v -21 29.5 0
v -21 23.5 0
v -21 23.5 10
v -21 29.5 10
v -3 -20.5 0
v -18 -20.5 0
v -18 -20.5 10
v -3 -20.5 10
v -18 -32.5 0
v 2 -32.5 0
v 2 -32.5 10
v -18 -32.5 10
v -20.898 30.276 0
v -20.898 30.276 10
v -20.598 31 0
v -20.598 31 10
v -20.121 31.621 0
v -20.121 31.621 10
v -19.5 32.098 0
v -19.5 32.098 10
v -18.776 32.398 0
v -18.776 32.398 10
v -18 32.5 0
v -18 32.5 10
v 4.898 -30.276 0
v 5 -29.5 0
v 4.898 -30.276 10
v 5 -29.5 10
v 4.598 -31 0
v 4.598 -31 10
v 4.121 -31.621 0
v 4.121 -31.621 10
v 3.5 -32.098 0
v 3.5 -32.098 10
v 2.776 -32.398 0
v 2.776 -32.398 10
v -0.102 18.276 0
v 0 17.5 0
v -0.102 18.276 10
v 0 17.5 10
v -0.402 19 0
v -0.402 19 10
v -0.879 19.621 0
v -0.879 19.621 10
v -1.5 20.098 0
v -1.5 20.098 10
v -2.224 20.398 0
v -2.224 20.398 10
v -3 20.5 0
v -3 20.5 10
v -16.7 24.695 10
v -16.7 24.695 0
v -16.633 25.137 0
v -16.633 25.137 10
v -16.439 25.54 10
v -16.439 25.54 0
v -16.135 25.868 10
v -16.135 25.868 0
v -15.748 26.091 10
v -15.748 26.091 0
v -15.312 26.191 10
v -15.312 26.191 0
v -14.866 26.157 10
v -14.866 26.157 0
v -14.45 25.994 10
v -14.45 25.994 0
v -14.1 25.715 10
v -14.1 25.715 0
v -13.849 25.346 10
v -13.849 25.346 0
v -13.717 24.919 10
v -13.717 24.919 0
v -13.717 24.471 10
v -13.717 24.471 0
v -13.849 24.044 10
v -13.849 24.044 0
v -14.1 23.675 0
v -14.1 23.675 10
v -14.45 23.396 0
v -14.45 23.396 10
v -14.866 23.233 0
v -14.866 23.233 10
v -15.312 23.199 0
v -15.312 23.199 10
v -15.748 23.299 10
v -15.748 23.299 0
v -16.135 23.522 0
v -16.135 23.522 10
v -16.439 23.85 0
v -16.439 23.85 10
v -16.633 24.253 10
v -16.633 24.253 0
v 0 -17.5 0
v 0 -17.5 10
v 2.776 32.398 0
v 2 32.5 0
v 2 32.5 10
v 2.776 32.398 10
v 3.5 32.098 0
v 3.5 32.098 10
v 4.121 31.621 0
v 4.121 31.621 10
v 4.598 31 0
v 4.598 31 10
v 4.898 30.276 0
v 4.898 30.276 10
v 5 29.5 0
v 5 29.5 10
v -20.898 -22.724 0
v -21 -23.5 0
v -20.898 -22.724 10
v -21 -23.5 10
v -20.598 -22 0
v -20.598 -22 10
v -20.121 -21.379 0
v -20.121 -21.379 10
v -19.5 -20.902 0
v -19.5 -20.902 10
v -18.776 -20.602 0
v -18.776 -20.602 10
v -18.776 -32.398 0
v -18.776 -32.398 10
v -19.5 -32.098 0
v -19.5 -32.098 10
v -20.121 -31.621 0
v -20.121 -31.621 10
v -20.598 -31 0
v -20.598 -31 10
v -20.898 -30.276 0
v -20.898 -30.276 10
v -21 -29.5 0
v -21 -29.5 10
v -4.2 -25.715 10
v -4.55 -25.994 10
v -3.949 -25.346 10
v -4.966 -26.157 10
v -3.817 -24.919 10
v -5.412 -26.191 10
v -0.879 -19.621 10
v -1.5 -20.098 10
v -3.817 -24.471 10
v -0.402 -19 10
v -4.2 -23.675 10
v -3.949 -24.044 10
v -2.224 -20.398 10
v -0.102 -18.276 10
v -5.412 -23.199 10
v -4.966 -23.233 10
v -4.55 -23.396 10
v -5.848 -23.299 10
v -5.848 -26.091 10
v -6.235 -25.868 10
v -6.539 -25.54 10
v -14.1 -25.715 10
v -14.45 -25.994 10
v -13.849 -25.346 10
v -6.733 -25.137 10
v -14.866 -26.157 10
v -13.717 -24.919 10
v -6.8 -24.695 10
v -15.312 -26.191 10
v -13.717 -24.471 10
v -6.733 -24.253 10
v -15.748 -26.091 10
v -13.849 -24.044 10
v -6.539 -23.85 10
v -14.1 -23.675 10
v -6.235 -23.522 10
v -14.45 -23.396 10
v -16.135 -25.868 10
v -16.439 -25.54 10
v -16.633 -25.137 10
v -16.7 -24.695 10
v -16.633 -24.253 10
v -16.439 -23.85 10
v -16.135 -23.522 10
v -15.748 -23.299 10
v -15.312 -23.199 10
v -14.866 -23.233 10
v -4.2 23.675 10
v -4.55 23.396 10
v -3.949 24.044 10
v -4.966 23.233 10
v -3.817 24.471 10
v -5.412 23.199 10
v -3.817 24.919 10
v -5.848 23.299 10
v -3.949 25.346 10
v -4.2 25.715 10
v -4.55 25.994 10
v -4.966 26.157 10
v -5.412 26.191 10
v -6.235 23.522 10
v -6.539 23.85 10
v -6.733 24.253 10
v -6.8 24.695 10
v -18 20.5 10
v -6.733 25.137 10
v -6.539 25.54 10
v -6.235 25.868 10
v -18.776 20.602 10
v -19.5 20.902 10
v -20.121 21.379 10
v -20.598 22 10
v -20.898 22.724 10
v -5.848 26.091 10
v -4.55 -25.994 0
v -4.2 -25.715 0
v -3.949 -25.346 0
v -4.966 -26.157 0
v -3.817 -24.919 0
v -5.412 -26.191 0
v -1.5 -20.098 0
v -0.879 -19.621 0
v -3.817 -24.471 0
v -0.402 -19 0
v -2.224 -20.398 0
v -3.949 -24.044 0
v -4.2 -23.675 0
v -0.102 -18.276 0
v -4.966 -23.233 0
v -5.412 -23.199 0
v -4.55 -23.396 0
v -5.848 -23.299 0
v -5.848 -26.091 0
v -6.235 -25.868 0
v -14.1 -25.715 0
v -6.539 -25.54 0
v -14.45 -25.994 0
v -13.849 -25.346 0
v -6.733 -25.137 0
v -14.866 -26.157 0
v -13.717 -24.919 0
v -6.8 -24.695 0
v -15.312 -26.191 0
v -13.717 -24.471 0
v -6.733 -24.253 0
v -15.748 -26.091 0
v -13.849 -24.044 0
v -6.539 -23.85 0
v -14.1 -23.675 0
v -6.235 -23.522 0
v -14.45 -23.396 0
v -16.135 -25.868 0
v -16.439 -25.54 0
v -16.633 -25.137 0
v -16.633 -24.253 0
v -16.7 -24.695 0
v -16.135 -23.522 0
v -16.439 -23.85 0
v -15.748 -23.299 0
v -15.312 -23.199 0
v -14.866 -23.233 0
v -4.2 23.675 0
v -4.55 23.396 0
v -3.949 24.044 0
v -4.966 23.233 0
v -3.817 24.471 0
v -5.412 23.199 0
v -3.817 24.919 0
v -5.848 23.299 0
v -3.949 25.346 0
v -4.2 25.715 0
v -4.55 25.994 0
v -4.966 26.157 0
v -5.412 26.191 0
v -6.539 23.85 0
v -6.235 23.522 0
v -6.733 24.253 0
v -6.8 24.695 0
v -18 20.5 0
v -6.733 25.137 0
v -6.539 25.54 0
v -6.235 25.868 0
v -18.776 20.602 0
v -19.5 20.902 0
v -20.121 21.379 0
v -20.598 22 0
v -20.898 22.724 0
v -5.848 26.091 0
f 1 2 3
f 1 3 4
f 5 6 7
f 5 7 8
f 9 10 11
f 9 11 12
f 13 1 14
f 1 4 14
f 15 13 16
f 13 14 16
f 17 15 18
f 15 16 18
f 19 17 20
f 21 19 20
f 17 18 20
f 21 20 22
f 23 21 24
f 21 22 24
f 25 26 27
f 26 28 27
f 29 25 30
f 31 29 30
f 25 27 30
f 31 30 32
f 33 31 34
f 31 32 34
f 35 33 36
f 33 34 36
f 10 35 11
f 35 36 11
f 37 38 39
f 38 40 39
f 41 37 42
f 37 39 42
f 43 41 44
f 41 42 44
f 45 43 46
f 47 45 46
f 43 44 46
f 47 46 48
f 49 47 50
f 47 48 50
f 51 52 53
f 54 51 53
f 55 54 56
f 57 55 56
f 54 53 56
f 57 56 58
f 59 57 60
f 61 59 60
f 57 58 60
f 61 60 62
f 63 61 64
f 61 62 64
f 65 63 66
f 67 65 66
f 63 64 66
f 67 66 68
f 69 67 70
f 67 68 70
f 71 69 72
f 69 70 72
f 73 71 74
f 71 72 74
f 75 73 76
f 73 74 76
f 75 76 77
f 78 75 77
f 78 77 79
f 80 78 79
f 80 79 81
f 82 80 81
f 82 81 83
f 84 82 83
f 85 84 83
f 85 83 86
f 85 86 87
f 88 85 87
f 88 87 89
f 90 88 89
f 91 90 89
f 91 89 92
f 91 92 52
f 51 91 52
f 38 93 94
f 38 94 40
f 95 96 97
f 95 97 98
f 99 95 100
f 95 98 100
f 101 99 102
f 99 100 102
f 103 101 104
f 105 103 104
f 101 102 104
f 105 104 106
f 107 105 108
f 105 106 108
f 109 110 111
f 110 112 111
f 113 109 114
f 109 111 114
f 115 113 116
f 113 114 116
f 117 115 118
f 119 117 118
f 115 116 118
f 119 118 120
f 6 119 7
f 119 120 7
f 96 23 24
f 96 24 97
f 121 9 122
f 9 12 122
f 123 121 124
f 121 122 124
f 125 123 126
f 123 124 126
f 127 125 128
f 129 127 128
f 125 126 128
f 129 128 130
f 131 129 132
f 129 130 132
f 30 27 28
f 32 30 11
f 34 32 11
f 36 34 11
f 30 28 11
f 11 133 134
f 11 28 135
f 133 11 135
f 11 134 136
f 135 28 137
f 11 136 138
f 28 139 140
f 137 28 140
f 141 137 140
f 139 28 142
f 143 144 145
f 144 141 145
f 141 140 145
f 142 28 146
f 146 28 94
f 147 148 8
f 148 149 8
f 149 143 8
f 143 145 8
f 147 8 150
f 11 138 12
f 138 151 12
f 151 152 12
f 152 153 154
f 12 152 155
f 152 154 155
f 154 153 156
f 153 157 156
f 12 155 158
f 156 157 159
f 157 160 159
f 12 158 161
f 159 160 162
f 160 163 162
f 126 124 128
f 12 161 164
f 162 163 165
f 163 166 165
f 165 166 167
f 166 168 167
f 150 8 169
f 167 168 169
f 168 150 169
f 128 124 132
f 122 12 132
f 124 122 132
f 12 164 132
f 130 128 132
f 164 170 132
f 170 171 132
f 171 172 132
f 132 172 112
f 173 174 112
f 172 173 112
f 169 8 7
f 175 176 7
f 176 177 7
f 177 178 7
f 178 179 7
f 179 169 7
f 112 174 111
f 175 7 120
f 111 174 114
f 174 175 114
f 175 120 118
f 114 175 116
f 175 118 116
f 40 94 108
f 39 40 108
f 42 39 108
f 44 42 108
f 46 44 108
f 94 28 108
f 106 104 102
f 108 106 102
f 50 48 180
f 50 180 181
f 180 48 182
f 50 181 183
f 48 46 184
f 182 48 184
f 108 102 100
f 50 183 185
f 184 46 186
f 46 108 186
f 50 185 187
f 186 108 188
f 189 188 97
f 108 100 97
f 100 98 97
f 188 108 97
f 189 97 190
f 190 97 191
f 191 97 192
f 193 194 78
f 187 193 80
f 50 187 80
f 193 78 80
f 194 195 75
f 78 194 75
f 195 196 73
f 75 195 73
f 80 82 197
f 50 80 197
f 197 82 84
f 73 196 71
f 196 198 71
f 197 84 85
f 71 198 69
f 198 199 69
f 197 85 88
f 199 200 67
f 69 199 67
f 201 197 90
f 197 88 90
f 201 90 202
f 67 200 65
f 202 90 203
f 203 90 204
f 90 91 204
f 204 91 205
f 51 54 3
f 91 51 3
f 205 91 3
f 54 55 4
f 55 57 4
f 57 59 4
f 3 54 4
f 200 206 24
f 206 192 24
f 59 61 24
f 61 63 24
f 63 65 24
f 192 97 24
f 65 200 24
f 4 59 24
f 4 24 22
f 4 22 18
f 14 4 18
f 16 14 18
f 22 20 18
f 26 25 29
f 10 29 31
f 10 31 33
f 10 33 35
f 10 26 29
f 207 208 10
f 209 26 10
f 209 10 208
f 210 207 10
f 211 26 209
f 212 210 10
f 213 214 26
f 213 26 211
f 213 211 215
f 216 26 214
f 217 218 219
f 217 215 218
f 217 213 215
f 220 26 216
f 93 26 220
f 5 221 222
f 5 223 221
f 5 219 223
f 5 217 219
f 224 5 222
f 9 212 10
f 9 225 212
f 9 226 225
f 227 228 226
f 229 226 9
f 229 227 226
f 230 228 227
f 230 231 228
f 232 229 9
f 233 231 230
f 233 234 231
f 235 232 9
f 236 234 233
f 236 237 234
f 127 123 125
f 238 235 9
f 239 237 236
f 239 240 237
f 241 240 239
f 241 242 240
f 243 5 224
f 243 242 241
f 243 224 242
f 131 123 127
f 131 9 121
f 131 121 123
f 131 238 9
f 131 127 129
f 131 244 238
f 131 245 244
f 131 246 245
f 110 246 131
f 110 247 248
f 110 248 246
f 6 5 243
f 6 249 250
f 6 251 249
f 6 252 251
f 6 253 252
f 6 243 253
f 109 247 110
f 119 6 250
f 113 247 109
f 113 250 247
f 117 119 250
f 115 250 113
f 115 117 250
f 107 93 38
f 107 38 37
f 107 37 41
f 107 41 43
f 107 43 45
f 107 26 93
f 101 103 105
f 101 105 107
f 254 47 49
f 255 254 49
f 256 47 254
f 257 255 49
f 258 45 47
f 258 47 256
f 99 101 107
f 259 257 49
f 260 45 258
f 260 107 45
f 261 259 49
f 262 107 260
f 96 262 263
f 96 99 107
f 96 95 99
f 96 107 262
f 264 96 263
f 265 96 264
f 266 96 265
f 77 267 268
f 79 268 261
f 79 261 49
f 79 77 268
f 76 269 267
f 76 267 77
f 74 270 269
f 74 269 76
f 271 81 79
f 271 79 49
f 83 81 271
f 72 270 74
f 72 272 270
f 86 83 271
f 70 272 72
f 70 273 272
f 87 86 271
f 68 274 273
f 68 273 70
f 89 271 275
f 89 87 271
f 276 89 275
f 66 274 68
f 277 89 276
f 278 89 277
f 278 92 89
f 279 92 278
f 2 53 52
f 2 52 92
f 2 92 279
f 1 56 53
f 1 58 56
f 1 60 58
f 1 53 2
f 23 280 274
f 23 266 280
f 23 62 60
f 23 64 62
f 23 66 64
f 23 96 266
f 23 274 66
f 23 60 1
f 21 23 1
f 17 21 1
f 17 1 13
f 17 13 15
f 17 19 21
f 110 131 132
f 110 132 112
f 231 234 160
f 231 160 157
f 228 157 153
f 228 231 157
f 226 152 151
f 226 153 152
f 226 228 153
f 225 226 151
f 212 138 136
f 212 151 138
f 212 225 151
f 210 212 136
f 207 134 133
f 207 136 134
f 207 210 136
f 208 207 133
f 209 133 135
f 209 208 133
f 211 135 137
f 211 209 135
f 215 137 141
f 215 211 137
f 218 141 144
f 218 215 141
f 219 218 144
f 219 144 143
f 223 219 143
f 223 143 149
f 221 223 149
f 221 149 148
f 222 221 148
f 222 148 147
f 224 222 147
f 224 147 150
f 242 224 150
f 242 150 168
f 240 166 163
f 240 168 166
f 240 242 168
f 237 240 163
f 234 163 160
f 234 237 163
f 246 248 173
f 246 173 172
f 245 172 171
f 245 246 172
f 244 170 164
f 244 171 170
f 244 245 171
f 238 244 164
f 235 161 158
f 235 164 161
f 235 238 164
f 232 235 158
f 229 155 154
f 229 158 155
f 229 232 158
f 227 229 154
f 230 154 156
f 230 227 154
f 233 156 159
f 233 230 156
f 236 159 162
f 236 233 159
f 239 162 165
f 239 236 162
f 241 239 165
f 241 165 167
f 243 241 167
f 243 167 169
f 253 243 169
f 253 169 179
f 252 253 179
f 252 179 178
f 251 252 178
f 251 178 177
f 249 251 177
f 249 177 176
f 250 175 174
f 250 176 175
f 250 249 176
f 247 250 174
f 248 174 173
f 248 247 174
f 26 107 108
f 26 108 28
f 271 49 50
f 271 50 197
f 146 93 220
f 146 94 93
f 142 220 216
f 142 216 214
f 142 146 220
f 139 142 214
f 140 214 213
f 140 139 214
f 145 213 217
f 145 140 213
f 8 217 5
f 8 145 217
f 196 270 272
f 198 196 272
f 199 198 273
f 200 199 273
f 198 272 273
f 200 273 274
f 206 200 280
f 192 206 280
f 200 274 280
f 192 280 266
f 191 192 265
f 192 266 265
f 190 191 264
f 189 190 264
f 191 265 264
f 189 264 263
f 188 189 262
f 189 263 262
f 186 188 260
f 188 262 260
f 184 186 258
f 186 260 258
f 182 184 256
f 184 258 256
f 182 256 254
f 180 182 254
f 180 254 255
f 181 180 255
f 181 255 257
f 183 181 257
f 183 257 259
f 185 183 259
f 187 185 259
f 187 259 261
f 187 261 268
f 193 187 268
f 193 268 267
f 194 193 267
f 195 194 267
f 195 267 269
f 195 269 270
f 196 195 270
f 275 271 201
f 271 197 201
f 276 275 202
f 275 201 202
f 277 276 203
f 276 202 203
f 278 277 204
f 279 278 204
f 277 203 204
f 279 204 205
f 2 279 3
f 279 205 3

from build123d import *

# Parameters (mm, degrees)
BOSS_EXTRUDE1_DEPTH   = 10
FILLET1_R             = 3
F_3_0MM_DOWEL_HOLE1_D = 3


with BuildPart() as part:
    # Sketch1 → Boss-Extrude1 (new body)
    with BuildSketch(Plane.XY):
        Polygon((0, -20.5), (0, 20.5), (-21, 20.5), (-21, 32.5), (5, 32.5), (5, -32.5), (-21, -32.5), (-21, -20.5), align=None)
    extrude(amount=BOSS_EXTRUDE1_DEPTH)

    # Fillet1
    fillet1_edges = [part.edges().sort_by_distance(p)[0] for p in [
        (0, -20.5, 5),
        (0, 20.5, 5),
        (-21, 20.5, 5),
        (-21, 32.5, 5),
        (5, 32.5, 5),
        (5, -32.5, 5),
        (-21, -32.5, 5),
        (-21, -20.5, 5),
    ]]
    fillet(fillet1_edges, radius=FILLET1_R)

    # Ø3.0mm Dowel Hole1 (through all)
    with Locations(Plane.XY.offset(10)):
        with Locations((-5.3, 24.695), (-15.2, 24.695)):
            f_3_0mm_dowel_hole1 = Hole(F_3_0MM_DOWEL_HOLE1_D / 2)

    # Mirror1: Ø3.0mm Dowel Hole1 across plane
    add(f_3_0mm_dowel_hole1.mirror(Plane.ZX), mode=Mode.SUBTRACT)


solid = part.part
